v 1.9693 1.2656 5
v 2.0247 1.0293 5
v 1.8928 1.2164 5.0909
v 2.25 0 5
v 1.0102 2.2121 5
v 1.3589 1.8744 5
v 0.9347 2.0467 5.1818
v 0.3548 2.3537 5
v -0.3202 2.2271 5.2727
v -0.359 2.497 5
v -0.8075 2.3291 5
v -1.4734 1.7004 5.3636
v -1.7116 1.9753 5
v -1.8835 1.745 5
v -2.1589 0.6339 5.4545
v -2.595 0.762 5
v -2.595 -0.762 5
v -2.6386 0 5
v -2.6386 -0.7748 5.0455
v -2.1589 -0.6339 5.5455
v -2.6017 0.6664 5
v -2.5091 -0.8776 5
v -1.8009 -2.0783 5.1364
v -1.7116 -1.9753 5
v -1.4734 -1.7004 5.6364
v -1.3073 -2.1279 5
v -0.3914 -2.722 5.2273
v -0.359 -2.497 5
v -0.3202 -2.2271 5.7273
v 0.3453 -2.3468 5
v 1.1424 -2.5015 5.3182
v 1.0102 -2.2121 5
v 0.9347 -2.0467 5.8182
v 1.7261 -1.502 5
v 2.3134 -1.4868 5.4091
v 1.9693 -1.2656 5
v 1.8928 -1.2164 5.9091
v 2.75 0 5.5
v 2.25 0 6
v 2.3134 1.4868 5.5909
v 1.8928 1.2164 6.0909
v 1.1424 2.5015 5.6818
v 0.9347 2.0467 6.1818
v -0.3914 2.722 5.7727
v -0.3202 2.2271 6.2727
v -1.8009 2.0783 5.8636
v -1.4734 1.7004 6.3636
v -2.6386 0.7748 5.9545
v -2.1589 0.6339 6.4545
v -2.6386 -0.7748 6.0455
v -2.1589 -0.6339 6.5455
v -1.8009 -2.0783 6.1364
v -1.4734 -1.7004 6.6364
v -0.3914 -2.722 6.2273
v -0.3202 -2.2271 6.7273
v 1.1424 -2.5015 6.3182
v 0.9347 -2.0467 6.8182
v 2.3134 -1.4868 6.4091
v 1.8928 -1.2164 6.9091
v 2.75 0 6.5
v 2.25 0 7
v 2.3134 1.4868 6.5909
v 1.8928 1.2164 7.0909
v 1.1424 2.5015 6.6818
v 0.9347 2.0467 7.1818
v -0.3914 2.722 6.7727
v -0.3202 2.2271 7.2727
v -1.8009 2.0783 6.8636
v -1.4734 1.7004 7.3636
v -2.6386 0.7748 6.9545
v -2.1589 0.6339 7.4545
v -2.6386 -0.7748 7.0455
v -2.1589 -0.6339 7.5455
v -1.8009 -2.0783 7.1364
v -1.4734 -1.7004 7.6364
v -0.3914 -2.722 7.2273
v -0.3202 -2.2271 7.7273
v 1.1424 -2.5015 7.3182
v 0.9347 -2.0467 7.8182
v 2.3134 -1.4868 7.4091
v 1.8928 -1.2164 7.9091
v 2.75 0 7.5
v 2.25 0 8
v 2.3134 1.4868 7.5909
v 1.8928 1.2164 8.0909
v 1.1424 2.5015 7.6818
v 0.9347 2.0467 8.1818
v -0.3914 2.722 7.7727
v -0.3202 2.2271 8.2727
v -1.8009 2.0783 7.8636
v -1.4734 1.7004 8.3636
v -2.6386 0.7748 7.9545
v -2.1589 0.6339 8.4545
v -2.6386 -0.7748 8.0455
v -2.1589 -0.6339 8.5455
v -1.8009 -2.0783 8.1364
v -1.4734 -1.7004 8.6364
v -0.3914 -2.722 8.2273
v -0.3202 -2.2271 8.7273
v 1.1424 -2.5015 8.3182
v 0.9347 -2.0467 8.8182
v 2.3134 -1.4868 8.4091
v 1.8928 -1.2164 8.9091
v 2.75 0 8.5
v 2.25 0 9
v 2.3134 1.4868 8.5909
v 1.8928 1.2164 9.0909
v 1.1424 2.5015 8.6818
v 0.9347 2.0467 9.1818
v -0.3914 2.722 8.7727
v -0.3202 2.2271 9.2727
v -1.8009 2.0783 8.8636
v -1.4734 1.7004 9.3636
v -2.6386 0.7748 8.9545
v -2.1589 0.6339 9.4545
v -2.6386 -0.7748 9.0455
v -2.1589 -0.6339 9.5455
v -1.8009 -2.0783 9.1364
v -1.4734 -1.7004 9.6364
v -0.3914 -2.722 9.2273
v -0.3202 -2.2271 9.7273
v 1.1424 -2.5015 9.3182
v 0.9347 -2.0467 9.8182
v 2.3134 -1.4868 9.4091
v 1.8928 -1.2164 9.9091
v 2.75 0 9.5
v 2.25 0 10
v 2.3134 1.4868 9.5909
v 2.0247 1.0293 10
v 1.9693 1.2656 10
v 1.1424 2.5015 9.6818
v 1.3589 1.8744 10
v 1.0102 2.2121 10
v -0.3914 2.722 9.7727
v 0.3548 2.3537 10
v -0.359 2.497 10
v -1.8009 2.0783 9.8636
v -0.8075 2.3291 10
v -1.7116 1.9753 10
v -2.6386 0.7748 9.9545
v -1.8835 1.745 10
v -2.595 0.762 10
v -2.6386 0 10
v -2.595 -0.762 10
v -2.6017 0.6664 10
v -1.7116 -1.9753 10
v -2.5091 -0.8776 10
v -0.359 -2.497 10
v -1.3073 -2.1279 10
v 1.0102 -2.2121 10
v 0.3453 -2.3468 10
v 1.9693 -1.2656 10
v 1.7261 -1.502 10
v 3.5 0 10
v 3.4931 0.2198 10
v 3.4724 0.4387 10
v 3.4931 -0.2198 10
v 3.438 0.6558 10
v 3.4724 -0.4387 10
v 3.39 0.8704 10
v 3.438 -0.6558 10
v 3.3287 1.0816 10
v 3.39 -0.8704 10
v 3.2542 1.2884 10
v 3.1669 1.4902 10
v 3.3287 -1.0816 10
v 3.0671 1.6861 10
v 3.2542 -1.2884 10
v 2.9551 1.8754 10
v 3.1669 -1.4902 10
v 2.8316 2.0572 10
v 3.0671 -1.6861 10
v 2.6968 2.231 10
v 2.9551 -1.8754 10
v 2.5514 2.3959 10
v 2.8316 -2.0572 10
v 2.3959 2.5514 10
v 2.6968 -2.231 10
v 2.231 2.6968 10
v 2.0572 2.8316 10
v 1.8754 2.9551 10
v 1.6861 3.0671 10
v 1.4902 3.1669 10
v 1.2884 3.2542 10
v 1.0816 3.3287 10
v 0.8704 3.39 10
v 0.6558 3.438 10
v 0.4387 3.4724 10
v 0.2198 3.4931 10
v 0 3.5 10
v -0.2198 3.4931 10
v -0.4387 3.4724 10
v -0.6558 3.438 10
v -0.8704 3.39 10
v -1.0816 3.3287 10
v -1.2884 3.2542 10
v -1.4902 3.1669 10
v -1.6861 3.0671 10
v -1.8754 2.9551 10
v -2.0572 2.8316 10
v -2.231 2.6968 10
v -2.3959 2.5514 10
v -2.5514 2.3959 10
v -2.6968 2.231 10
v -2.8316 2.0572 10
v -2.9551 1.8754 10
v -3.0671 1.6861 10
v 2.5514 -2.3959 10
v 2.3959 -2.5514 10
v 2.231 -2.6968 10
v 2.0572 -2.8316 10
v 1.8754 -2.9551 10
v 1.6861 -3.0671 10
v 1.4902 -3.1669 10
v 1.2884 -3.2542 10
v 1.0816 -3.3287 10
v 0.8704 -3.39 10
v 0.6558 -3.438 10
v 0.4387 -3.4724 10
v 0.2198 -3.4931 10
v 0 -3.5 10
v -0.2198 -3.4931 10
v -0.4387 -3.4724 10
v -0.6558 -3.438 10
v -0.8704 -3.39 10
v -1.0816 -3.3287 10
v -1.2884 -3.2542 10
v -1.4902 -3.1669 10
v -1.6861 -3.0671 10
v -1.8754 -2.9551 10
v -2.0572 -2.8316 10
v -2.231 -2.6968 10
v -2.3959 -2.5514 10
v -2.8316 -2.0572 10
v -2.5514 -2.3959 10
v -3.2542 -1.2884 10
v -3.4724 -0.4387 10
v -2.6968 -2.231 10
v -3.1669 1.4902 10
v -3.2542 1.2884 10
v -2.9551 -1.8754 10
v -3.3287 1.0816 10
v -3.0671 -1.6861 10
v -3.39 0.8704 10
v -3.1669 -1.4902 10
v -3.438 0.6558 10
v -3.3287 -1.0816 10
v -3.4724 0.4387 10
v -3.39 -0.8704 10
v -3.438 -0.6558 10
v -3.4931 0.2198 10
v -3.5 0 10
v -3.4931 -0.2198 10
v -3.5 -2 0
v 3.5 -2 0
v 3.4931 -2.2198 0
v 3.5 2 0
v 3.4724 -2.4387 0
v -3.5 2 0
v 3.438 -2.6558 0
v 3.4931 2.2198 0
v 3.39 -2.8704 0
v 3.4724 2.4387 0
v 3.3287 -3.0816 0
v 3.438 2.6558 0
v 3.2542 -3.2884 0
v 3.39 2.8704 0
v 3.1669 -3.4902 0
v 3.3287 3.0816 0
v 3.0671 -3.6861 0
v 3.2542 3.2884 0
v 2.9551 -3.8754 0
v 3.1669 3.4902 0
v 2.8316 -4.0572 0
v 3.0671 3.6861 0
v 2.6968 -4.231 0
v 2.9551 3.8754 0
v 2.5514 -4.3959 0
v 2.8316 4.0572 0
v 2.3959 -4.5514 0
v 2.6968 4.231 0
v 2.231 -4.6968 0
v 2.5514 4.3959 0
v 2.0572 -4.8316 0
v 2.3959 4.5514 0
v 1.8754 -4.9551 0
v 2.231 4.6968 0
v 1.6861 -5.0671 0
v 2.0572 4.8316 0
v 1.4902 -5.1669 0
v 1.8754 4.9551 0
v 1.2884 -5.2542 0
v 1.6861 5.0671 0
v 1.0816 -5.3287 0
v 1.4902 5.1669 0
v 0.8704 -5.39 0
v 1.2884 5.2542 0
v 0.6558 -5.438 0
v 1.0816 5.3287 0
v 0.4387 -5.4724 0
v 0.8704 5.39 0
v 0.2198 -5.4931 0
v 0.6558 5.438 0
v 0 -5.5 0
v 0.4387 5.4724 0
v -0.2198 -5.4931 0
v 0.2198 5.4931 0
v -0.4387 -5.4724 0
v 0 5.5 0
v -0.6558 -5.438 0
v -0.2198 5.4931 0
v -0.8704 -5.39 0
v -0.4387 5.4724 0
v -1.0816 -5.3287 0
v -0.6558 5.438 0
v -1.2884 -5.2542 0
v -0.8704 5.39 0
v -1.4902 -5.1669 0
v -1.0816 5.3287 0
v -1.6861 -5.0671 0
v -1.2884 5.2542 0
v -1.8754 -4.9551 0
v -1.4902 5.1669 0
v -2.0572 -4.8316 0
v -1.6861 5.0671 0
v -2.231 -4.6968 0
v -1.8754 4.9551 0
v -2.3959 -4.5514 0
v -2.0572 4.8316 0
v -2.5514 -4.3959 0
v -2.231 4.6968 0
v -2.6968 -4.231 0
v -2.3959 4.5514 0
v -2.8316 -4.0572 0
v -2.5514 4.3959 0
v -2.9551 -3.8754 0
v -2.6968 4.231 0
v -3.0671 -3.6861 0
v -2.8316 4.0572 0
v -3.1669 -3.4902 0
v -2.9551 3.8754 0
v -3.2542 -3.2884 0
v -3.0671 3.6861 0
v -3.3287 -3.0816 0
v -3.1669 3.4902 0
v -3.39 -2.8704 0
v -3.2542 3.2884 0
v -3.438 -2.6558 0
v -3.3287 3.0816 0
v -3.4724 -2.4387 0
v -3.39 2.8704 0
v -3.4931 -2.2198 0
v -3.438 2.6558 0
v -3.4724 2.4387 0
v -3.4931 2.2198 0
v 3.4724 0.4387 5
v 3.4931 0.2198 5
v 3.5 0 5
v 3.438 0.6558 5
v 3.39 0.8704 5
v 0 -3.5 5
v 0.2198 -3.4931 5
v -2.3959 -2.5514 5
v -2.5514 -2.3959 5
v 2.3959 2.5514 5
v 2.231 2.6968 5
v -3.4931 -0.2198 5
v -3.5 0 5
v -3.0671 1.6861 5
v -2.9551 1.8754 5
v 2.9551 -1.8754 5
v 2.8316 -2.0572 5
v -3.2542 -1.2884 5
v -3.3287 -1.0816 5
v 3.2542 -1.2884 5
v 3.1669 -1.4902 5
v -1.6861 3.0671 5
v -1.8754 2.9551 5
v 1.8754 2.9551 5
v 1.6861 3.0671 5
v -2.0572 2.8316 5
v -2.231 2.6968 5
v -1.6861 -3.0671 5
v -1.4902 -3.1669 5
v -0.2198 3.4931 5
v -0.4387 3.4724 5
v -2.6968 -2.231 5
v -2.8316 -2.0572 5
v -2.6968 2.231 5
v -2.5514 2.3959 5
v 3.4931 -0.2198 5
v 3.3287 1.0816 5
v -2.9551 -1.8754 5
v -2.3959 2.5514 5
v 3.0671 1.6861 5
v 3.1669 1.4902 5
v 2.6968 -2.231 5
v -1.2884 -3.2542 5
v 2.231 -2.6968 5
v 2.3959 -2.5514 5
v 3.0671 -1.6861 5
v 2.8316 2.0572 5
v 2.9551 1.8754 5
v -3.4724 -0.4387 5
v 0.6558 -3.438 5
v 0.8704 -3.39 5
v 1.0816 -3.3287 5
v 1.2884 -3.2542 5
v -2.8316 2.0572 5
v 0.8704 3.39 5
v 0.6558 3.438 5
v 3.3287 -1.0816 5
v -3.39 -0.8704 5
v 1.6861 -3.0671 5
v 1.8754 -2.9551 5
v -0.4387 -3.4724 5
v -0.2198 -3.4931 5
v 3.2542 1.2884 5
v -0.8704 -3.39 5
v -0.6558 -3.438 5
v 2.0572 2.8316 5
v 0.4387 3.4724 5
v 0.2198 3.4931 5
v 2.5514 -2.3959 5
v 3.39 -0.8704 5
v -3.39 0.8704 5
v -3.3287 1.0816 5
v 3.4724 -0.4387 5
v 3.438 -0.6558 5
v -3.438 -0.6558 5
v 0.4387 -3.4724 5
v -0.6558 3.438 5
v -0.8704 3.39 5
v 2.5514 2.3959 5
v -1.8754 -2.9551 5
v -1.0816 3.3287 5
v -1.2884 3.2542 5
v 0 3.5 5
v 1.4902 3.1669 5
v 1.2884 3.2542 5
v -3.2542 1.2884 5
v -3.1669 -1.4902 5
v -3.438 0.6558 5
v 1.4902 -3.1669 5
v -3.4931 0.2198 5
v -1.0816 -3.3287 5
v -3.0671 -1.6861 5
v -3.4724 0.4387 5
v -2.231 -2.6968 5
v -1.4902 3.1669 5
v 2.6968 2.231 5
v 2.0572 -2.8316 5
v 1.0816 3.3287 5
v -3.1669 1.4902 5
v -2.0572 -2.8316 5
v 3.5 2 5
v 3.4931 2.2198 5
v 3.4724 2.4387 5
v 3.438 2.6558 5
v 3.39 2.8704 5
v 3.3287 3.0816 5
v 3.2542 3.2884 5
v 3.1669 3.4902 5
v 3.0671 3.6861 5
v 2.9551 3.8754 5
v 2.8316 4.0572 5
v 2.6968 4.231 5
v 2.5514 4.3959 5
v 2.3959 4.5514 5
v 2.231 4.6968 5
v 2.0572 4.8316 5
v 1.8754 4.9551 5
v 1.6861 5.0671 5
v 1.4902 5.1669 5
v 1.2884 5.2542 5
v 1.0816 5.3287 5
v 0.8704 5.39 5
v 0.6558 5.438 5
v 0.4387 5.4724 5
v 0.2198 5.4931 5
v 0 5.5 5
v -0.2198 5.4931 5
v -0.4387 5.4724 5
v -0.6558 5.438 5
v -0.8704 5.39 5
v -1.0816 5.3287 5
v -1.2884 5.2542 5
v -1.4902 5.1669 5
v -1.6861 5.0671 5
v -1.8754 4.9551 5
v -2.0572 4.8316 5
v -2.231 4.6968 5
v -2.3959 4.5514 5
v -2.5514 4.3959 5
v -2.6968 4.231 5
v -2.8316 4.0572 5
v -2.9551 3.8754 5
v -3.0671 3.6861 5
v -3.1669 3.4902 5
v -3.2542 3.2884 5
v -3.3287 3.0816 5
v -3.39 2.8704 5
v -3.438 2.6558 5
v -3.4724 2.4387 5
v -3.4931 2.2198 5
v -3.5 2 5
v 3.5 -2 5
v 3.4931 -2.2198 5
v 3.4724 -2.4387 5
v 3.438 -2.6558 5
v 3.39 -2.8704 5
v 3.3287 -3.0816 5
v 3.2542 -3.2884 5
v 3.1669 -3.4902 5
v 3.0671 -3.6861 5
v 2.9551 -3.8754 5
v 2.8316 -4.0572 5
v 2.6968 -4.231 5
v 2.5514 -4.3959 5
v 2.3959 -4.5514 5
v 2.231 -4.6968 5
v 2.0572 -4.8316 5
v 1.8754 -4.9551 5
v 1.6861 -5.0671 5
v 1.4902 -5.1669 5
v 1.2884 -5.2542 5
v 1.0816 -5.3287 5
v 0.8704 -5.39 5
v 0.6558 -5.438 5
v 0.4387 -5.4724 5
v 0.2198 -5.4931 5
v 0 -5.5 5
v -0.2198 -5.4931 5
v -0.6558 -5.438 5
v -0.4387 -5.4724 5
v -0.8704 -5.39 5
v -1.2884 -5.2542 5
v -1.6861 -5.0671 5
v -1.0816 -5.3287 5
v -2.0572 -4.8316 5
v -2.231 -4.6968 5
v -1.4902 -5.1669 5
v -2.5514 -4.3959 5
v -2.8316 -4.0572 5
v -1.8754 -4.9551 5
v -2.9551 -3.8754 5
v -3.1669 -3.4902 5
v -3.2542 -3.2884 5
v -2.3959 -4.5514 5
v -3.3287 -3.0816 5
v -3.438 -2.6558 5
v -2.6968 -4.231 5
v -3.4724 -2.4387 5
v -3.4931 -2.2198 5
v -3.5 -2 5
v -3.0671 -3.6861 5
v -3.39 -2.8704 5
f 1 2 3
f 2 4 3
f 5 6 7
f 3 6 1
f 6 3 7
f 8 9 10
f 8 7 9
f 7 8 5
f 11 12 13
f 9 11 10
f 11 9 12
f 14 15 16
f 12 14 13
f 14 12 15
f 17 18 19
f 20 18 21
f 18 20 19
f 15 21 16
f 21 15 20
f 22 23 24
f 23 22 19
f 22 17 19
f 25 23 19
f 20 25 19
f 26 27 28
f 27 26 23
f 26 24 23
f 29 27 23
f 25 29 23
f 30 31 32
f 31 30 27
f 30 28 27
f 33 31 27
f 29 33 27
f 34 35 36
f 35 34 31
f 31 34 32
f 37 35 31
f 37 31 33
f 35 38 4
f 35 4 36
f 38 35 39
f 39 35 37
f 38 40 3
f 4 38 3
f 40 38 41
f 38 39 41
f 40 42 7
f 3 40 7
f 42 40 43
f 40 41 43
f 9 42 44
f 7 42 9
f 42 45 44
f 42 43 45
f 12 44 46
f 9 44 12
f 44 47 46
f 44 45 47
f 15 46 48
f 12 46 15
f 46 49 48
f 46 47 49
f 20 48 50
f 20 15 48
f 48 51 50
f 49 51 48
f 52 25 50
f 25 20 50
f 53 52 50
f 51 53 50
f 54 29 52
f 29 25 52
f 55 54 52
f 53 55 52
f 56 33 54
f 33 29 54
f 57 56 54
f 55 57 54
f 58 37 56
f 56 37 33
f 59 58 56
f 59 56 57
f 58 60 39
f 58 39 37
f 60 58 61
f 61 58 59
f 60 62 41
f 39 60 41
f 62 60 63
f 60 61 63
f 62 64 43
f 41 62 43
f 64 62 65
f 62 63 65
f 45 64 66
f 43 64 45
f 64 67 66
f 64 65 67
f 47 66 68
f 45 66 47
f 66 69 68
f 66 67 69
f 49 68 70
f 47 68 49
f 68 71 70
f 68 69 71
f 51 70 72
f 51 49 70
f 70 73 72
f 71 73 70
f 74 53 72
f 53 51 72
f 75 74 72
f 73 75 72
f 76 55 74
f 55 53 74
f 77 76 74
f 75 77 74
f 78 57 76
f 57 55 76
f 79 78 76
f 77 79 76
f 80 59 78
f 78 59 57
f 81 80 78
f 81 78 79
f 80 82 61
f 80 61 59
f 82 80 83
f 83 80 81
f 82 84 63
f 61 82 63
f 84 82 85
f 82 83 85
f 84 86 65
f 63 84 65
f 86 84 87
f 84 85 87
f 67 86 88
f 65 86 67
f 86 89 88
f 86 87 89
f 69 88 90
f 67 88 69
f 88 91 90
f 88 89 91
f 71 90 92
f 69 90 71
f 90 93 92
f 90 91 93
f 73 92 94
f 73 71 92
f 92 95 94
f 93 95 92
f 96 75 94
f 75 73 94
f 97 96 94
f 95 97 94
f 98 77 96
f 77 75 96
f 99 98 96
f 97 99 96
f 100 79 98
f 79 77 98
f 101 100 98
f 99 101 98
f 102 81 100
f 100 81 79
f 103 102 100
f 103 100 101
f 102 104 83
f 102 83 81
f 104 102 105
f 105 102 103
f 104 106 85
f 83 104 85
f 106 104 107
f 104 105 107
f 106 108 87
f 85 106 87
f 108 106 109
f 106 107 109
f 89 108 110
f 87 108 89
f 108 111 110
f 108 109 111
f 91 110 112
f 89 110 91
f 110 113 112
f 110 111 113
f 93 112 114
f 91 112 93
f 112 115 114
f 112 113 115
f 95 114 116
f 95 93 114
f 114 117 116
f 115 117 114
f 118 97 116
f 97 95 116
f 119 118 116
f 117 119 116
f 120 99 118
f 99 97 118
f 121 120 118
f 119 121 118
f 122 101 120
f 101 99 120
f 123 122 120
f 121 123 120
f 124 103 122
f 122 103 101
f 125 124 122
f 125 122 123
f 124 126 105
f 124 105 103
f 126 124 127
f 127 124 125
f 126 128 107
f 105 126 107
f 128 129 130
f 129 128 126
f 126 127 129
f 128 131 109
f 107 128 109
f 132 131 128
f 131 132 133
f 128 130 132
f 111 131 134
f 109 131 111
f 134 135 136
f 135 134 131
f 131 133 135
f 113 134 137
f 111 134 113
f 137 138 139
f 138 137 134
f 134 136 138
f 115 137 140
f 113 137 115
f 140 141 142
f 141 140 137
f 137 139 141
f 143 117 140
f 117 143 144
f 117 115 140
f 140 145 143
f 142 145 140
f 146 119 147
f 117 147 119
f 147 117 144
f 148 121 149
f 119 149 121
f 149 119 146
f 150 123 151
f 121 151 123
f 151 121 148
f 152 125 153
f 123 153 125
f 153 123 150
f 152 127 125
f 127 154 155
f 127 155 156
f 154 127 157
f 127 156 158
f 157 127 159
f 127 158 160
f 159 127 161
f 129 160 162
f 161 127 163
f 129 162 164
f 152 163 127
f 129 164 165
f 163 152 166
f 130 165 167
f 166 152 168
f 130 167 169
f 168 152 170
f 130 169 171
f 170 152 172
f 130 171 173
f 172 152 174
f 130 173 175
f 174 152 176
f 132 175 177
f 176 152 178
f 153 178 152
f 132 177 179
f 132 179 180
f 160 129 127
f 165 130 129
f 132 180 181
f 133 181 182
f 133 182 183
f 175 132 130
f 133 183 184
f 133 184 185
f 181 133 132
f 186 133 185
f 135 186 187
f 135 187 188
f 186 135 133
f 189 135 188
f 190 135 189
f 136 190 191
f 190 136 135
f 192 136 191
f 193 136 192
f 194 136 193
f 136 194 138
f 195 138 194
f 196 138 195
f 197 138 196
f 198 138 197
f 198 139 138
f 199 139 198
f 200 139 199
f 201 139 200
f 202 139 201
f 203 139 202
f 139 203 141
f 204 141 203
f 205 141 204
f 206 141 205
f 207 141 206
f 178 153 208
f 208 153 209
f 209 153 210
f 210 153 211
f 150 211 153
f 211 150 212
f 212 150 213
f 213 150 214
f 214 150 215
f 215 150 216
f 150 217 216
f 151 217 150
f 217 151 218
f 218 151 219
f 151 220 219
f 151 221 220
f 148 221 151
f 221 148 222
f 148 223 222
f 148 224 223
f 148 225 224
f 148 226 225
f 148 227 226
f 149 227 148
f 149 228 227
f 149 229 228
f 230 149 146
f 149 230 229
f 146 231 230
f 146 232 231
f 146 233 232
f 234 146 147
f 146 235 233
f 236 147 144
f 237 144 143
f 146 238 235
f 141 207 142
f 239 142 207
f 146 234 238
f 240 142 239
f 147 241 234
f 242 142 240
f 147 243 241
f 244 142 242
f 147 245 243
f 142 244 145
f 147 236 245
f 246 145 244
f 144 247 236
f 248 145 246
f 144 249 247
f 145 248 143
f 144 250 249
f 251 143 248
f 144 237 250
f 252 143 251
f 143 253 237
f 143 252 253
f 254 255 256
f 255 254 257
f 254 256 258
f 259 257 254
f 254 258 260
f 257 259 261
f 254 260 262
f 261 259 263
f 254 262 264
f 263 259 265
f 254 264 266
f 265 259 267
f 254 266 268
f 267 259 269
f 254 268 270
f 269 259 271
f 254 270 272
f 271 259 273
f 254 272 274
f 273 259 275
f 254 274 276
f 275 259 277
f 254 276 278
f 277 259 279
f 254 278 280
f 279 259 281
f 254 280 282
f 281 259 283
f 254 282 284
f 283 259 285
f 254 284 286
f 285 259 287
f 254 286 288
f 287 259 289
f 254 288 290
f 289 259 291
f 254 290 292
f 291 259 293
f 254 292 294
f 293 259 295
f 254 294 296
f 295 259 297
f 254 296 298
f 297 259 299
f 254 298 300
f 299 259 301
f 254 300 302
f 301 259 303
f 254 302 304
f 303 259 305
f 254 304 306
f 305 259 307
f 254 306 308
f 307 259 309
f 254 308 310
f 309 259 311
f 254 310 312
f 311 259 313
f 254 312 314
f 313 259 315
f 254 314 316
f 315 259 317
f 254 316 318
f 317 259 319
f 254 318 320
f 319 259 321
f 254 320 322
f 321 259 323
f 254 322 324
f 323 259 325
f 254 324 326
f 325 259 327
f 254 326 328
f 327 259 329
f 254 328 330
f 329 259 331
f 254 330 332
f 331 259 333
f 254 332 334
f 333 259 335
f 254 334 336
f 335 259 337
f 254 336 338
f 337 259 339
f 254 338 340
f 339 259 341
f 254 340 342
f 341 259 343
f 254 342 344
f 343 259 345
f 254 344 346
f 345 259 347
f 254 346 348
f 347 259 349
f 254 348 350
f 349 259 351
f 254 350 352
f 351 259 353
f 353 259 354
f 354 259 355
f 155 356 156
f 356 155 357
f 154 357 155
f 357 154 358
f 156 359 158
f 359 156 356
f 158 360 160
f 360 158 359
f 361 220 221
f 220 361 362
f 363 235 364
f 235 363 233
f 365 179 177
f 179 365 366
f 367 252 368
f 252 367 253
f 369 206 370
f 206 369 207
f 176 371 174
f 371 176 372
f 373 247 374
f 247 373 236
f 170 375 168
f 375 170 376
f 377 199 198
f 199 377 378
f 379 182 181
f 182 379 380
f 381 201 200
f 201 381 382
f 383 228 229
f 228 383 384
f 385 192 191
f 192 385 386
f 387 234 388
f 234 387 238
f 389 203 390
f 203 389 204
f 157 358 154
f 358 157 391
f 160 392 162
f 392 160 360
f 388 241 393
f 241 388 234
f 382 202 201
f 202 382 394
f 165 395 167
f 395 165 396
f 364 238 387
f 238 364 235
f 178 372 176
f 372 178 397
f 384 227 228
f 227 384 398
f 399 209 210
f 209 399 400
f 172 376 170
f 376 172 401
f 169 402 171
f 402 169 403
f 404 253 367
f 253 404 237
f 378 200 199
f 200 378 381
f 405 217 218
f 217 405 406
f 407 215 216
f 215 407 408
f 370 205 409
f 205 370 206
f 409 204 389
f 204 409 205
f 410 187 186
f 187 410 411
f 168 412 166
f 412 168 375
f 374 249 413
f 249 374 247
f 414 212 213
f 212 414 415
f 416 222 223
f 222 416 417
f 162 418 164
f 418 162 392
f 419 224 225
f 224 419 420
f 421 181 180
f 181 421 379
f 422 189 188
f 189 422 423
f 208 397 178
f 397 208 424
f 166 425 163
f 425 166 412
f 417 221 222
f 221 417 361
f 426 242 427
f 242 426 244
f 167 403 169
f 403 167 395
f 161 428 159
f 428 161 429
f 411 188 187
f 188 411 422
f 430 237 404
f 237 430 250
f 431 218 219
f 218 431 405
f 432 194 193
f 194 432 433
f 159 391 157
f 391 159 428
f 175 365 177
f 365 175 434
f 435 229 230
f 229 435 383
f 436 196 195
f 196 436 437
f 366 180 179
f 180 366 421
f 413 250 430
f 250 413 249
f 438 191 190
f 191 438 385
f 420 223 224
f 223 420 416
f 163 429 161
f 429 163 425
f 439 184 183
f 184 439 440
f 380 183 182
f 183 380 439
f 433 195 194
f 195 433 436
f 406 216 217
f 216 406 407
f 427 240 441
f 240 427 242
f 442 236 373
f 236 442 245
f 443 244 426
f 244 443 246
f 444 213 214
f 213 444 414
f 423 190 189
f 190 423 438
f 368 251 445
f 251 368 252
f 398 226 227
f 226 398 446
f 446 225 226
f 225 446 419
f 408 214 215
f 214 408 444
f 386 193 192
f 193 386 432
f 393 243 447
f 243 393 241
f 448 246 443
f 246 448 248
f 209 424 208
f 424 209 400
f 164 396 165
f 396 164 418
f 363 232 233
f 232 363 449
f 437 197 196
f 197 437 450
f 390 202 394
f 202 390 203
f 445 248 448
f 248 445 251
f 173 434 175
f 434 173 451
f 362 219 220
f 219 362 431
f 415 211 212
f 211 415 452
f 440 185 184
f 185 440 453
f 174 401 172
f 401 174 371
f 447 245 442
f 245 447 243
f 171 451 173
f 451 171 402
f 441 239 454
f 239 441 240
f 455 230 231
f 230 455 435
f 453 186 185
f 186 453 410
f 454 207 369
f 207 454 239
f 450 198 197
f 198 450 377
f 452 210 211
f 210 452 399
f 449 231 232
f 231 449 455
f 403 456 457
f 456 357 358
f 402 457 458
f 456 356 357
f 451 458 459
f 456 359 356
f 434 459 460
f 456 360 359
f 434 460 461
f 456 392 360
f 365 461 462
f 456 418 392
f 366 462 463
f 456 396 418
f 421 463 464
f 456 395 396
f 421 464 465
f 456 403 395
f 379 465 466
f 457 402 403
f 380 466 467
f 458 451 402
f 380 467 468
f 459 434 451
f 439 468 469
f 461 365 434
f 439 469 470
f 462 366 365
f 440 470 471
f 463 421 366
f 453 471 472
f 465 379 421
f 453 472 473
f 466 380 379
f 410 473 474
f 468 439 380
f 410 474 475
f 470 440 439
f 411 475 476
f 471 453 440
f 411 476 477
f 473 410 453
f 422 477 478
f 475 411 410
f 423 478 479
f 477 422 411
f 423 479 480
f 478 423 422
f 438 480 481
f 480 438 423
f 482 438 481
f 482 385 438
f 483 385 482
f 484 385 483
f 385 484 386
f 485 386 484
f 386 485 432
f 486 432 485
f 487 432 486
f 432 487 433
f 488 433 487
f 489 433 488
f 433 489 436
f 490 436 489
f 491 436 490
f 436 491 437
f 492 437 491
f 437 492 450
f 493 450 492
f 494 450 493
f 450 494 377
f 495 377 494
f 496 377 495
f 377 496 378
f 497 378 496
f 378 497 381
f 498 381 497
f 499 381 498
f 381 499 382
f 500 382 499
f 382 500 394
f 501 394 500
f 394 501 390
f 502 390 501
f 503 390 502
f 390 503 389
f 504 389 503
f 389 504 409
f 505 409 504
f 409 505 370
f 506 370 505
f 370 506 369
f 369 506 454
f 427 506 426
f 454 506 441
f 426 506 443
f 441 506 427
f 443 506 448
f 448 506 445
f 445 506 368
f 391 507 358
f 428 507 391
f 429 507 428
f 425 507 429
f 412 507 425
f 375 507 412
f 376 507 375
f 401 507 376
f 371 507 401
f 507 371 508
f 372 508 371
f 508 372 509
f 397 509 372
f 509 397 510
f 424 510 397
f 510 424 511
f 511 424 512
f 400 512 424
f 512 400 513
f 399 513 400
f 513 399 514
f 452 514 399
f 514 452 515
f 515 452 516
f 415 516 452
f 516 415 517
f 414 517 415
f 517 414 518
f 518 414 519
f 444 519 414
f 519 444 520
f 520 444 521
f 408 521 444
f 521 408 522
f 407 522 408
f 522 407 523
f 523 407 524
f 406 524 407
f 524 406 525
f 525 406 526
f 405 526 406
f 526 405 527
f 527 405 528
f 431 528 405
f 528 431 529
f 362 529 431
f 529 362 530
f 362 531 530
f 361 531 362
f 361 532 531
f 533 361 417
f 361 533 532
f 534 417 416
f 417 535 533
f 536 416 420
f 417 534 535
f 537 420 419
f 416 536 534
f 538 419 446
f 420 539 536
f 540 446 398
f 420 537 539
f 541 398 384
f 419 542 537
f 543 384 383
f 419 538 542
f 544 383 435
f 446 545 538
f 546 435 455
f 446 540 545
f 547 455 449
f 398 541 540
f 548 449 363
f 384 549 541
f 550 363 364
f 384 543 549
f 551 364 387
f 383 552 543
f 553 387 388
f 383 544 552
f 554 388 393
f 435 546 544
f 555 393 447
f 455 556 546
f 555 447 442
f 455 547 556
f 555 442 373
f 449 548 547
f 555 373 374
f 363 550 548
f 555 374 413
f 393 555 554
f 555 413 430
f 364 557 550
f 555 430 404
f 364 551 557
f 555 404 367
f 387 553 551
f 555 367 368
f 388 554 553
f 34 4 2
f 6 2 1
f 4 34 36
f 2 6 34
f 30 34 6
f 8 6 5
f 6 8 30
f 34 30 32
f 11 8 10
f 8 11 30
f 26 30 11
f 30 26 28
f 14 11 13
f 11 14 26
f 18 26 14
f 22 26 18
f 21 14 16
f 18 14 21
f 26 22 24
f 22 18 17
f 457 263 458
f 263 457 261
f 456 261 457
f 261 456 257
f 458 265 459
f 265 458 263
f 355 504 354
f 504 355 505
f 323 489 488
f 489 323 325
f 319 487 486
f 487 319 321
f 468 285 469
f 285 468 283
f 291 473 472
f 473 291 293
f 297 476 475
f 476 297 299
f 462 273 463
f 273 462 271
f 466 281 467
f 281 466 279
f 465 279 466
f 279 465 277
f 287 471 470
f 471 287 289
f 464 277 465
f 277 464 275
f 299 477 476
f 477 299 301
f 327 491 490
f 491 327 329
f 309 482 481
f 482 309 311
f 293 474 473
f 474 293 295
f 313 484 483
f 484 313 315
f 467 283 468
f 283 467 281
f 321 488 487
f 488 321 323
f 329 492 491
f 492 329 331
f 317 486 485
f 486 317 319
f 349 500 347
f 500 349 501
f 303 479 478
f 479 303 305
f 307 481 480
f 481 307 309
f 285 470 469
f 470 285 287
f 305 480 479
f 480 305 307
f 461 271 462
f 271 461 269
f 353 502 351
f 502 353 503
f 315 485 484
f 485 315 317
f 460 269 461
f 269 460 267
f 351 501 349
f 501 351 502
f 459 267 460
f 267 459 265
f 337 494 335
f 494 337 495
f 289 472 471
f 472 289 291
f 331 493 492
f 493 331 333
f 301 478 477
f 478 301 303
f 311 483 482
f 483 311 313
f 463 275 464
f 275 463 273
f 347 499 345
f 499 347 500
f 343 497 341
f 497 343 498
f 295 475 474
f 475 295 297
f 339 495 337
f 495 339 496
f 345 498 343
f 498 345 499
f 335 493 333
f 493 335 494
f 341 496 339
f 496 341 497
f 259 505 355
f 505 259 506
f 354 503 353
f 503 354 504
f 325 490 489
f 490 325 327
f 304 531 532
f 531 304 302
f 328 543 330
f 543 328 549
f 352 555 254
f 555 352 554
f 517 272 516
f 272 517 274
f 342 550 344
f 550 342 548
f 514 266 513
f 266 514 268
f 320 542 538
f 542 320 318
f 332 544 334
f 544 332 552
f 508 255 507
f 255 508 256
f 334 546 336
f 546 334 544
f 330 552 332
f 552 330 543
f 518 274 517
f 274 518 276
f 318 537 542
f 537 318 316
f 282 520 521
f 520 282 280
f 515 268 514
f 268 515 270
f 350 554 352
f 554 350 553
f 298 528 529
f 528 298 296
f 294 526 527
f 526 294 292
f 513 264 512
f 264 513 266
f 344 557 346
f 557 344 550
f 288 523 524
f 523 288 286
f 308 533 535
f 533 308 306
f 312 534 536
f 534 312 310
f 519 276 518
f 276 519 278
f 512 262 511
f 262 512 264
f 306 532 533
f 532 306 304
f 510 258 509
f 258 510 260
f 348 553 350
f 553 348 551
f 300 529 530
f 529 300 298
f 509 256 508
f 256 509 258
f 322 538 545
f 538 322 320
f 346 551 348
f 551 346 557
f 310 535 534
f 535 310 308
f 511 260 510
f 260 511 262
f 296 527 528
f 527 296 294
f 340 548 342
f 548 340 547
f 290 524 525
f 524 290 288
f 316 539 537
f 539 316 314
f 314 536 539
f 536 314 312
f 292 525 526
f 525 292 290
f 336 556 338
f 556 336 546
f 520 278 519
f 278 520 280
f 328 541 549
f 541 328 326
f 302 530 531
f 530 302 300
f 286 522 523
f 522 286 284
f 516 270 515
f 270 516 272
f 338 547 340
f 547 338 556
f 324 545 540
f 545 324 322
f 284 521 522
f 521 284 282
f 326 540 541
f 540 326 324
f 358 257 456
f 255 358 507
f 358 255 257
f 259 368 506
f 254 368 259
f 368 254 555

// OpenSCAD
// file: polyScrewThread.scad
/*
 *    polyScrewThread.scad    by aubenc @ Thingiverse
 *
 * This script contains the library modules that can be used to generate
 * threaded rods, screws and nuts.
 *
 * http://www.thingiverse.com/thing:8796
 *
 * CC Public Domain
 */

module screw_thread(od,st,lf0,lt,rs,cs)
{
    or=od/2;
    ir=or-st/2*cos(lf0)/sin(lf0);
    pf=2*PI*or;
    sn=floor(pf/rs);
    lfxy=360/sn;
    ttn=round(lt/st)+1;
    zt=st/sn;

    intersection()
    {
        if (cs >= -1)
        {
           # thread_shape(cs,lt,or,ir,sn,st);
        }

        full_thread(ttn,st,sn,zt,lfxy,or,ir);
    }
}

module hex_nut(df,hg,sth,clf,cod,crs)
{

    difference()
    {
        hex_head(hg,df);

        hex_countersink_ends(sth/2,cod,clf,crs,hg);

        screw_thread(cod,sth,clf,hg,crs,-2);
    }
}

module hex_screw(od,st,lf0,lt,rs,cs,df,hg,ntl,ntd)
{
    ntr=od/2-(st/2+0.1)*cos(lf0)/sin(lf0);

    union()
    {
        hex_head(hg,df);

        translate([0,0,hg])
        if ( ntl == 0 )
        {
            cylinder(h=0.01, r=ntr, center=true);
        }
        else
        {
            if ( ntd == -1 )
            {
                cylinder(h=ntl+0.01, r=ntr, $fn=floor(od*PI/rs), center=false);
            }
            else if ( ntd == 0 )
            {
                union()
                {
                    cylinder(h=ntl-st/2,
                             r=od/2, $fn=floor(od*PI/rs), center=false);

                    translate([0,0,ntl-st/2])
                    cylinder(h=st/2,
                             r1=od/2, r2=ntr, 
                             $fn=floor(od*PI/rs), center=false);
                }
            }
            else
            {
                cylinder(h=ntl, r=ntd/2, $fn=ntd*PI/rs, center=false);
            }
        }

        translate([0,0,ntl+hg]) screw_thread(od,st,lf0,lt,rs,cs);
    }
}

module thread_shape(cs,lt,or,ir,sn,st)
{
    if ( cs == 0 )
    {
        cylinder(h=lt, r=or, $fn=sn, center=false);
    }
    else
    {
        union()
        {
            translate([0,0,st/2])
              cylinder(h=lt-st+0.005, r=or, $fn=sn, center=false);

            if ( cs == -1 || cs == 2 )
            {
                cylinder(h=st/2, r1=ir, r2=or, $fn=sn, center=false);
            }
            else
            {
                cylinder(h=st/2, r=or, $fn=sn, center=false);
            }

            translate([0,0,lt-st/2])
            if ( cs == 1 || cs == 2 )
            {
                  cylinder(h=st/2, r1=or, r2=ir, $fn=sn, center=false);
            }
            else
            {
                cylinder(h=st/2, r=or, $fn=sn, center=false);
            }
        }
    }
}

module full_thread(ttn,st,sn,zt,lfxy,or,ir)
{
    for(i=[0:ttn-1])
    {
        for(j=[0:sn-1])
        {
            polyhedron(
                  points=[
                          [0,                  0,                  i*st-st            ],
                          [ir*cos((j+1)*lfxy), ir*sin((j+1)*lfxy), i*st+(j+1)*zt-st   ],
                          [ir*cos(j*lfxy),     ir*sin(j*lfxy),     i*st+j*zt-st       ],
                          [or*cos((j+1)*lfxy), or*sin((j+1)*lfxy), i*st+(j+1)*zt-st/2 ],
                          [or*cos(j*lfxy),     or*sin(j*lfxy),     i*st+j*zt-st/2     ],
                          [0,                  0,                  i*st+st            ],
                          [ir*cos((j+1)*lfxy), ir*sin((j+1)*lfxy), i*st+(j+1)*zt      ],
                          [ir*cos(j*lfxy),     ir*sin(j*lfxy),     i*st+j*zt          ]
                         ],
               triangles=[
                          [0,1,2],
                          [5,6,3],[5,3,0],[0,3,1],
                          [3,4,1],[1,4,2],
                          [3,6,4],[4,6,7],
                          [0,2,4],[0,4,5],[5,4,7],
                          [5,7,6]
                         ],
               convexity=5);
        }
    }
}

module hex_head(hg,df)
{
    cylinder(h=hg, r=df/2/sin(60), $fn=6, center=false);
}

module hex_countersink_ends(chg,cod,clf,crs,hg)
{
    translate([0,0,-0.1])
    cylinder(h=chg+0.01, 
             r1=cod/2, 
             r2=cod/2-(chg+0.1)*cos(clf)/sin(clf),
             $fn=floor(cod*PI/crs), center=false);

    translate([0,0,hg-chg+0.1])
    cylinder(h=chg+0.01, 
             r1=cod/2-(chg+0.1)*cos(clf)/sin(clf),
             r2=cod/2, 
             $fn=floor(cod*PI/crs), center=false);
}
// main file
//All mesurements are in mm
include <polyScrewThread.scad>
PI=3.141592;

$fn=100;
flat_height=5;
flat_width=5.5;
flat_lenght=37;
flat_tapper_height=2;
flat_tapper_offset_mag_side=flat_height;
flat_tapper_offset_trigger_side=14;
flat_tapper_offset_trigger_side_lenght=9;
thread_height=10;

bolt_lenght=30;
bolt_diam=5;
bolt_offset=5;

bolt_hole_diam=7;
bolt_hole_height=11;



bh_offset=(bolt_hole_height-bolt_hole_diam)/2; //Dont Set

difference(){
cylinder(r=bolt_hole_diam/2,h=10);
screw_thread(bolt_diam+0.5,   1,   45,    thread_height,    PI/2,    0);
}
translate([0,bh_offset,0])cylinder(r=bolt_hole_diam/2,h=5);
translate([0,-bh_offset,0])cylinder(r=bolt_hole_diam/2,h=5);
translate([-bolt_hole_diam/2,-bh_offset,0])cube([bolt_hole_diam,(bolt_hole_height-bolt_hole_diam),5]);
